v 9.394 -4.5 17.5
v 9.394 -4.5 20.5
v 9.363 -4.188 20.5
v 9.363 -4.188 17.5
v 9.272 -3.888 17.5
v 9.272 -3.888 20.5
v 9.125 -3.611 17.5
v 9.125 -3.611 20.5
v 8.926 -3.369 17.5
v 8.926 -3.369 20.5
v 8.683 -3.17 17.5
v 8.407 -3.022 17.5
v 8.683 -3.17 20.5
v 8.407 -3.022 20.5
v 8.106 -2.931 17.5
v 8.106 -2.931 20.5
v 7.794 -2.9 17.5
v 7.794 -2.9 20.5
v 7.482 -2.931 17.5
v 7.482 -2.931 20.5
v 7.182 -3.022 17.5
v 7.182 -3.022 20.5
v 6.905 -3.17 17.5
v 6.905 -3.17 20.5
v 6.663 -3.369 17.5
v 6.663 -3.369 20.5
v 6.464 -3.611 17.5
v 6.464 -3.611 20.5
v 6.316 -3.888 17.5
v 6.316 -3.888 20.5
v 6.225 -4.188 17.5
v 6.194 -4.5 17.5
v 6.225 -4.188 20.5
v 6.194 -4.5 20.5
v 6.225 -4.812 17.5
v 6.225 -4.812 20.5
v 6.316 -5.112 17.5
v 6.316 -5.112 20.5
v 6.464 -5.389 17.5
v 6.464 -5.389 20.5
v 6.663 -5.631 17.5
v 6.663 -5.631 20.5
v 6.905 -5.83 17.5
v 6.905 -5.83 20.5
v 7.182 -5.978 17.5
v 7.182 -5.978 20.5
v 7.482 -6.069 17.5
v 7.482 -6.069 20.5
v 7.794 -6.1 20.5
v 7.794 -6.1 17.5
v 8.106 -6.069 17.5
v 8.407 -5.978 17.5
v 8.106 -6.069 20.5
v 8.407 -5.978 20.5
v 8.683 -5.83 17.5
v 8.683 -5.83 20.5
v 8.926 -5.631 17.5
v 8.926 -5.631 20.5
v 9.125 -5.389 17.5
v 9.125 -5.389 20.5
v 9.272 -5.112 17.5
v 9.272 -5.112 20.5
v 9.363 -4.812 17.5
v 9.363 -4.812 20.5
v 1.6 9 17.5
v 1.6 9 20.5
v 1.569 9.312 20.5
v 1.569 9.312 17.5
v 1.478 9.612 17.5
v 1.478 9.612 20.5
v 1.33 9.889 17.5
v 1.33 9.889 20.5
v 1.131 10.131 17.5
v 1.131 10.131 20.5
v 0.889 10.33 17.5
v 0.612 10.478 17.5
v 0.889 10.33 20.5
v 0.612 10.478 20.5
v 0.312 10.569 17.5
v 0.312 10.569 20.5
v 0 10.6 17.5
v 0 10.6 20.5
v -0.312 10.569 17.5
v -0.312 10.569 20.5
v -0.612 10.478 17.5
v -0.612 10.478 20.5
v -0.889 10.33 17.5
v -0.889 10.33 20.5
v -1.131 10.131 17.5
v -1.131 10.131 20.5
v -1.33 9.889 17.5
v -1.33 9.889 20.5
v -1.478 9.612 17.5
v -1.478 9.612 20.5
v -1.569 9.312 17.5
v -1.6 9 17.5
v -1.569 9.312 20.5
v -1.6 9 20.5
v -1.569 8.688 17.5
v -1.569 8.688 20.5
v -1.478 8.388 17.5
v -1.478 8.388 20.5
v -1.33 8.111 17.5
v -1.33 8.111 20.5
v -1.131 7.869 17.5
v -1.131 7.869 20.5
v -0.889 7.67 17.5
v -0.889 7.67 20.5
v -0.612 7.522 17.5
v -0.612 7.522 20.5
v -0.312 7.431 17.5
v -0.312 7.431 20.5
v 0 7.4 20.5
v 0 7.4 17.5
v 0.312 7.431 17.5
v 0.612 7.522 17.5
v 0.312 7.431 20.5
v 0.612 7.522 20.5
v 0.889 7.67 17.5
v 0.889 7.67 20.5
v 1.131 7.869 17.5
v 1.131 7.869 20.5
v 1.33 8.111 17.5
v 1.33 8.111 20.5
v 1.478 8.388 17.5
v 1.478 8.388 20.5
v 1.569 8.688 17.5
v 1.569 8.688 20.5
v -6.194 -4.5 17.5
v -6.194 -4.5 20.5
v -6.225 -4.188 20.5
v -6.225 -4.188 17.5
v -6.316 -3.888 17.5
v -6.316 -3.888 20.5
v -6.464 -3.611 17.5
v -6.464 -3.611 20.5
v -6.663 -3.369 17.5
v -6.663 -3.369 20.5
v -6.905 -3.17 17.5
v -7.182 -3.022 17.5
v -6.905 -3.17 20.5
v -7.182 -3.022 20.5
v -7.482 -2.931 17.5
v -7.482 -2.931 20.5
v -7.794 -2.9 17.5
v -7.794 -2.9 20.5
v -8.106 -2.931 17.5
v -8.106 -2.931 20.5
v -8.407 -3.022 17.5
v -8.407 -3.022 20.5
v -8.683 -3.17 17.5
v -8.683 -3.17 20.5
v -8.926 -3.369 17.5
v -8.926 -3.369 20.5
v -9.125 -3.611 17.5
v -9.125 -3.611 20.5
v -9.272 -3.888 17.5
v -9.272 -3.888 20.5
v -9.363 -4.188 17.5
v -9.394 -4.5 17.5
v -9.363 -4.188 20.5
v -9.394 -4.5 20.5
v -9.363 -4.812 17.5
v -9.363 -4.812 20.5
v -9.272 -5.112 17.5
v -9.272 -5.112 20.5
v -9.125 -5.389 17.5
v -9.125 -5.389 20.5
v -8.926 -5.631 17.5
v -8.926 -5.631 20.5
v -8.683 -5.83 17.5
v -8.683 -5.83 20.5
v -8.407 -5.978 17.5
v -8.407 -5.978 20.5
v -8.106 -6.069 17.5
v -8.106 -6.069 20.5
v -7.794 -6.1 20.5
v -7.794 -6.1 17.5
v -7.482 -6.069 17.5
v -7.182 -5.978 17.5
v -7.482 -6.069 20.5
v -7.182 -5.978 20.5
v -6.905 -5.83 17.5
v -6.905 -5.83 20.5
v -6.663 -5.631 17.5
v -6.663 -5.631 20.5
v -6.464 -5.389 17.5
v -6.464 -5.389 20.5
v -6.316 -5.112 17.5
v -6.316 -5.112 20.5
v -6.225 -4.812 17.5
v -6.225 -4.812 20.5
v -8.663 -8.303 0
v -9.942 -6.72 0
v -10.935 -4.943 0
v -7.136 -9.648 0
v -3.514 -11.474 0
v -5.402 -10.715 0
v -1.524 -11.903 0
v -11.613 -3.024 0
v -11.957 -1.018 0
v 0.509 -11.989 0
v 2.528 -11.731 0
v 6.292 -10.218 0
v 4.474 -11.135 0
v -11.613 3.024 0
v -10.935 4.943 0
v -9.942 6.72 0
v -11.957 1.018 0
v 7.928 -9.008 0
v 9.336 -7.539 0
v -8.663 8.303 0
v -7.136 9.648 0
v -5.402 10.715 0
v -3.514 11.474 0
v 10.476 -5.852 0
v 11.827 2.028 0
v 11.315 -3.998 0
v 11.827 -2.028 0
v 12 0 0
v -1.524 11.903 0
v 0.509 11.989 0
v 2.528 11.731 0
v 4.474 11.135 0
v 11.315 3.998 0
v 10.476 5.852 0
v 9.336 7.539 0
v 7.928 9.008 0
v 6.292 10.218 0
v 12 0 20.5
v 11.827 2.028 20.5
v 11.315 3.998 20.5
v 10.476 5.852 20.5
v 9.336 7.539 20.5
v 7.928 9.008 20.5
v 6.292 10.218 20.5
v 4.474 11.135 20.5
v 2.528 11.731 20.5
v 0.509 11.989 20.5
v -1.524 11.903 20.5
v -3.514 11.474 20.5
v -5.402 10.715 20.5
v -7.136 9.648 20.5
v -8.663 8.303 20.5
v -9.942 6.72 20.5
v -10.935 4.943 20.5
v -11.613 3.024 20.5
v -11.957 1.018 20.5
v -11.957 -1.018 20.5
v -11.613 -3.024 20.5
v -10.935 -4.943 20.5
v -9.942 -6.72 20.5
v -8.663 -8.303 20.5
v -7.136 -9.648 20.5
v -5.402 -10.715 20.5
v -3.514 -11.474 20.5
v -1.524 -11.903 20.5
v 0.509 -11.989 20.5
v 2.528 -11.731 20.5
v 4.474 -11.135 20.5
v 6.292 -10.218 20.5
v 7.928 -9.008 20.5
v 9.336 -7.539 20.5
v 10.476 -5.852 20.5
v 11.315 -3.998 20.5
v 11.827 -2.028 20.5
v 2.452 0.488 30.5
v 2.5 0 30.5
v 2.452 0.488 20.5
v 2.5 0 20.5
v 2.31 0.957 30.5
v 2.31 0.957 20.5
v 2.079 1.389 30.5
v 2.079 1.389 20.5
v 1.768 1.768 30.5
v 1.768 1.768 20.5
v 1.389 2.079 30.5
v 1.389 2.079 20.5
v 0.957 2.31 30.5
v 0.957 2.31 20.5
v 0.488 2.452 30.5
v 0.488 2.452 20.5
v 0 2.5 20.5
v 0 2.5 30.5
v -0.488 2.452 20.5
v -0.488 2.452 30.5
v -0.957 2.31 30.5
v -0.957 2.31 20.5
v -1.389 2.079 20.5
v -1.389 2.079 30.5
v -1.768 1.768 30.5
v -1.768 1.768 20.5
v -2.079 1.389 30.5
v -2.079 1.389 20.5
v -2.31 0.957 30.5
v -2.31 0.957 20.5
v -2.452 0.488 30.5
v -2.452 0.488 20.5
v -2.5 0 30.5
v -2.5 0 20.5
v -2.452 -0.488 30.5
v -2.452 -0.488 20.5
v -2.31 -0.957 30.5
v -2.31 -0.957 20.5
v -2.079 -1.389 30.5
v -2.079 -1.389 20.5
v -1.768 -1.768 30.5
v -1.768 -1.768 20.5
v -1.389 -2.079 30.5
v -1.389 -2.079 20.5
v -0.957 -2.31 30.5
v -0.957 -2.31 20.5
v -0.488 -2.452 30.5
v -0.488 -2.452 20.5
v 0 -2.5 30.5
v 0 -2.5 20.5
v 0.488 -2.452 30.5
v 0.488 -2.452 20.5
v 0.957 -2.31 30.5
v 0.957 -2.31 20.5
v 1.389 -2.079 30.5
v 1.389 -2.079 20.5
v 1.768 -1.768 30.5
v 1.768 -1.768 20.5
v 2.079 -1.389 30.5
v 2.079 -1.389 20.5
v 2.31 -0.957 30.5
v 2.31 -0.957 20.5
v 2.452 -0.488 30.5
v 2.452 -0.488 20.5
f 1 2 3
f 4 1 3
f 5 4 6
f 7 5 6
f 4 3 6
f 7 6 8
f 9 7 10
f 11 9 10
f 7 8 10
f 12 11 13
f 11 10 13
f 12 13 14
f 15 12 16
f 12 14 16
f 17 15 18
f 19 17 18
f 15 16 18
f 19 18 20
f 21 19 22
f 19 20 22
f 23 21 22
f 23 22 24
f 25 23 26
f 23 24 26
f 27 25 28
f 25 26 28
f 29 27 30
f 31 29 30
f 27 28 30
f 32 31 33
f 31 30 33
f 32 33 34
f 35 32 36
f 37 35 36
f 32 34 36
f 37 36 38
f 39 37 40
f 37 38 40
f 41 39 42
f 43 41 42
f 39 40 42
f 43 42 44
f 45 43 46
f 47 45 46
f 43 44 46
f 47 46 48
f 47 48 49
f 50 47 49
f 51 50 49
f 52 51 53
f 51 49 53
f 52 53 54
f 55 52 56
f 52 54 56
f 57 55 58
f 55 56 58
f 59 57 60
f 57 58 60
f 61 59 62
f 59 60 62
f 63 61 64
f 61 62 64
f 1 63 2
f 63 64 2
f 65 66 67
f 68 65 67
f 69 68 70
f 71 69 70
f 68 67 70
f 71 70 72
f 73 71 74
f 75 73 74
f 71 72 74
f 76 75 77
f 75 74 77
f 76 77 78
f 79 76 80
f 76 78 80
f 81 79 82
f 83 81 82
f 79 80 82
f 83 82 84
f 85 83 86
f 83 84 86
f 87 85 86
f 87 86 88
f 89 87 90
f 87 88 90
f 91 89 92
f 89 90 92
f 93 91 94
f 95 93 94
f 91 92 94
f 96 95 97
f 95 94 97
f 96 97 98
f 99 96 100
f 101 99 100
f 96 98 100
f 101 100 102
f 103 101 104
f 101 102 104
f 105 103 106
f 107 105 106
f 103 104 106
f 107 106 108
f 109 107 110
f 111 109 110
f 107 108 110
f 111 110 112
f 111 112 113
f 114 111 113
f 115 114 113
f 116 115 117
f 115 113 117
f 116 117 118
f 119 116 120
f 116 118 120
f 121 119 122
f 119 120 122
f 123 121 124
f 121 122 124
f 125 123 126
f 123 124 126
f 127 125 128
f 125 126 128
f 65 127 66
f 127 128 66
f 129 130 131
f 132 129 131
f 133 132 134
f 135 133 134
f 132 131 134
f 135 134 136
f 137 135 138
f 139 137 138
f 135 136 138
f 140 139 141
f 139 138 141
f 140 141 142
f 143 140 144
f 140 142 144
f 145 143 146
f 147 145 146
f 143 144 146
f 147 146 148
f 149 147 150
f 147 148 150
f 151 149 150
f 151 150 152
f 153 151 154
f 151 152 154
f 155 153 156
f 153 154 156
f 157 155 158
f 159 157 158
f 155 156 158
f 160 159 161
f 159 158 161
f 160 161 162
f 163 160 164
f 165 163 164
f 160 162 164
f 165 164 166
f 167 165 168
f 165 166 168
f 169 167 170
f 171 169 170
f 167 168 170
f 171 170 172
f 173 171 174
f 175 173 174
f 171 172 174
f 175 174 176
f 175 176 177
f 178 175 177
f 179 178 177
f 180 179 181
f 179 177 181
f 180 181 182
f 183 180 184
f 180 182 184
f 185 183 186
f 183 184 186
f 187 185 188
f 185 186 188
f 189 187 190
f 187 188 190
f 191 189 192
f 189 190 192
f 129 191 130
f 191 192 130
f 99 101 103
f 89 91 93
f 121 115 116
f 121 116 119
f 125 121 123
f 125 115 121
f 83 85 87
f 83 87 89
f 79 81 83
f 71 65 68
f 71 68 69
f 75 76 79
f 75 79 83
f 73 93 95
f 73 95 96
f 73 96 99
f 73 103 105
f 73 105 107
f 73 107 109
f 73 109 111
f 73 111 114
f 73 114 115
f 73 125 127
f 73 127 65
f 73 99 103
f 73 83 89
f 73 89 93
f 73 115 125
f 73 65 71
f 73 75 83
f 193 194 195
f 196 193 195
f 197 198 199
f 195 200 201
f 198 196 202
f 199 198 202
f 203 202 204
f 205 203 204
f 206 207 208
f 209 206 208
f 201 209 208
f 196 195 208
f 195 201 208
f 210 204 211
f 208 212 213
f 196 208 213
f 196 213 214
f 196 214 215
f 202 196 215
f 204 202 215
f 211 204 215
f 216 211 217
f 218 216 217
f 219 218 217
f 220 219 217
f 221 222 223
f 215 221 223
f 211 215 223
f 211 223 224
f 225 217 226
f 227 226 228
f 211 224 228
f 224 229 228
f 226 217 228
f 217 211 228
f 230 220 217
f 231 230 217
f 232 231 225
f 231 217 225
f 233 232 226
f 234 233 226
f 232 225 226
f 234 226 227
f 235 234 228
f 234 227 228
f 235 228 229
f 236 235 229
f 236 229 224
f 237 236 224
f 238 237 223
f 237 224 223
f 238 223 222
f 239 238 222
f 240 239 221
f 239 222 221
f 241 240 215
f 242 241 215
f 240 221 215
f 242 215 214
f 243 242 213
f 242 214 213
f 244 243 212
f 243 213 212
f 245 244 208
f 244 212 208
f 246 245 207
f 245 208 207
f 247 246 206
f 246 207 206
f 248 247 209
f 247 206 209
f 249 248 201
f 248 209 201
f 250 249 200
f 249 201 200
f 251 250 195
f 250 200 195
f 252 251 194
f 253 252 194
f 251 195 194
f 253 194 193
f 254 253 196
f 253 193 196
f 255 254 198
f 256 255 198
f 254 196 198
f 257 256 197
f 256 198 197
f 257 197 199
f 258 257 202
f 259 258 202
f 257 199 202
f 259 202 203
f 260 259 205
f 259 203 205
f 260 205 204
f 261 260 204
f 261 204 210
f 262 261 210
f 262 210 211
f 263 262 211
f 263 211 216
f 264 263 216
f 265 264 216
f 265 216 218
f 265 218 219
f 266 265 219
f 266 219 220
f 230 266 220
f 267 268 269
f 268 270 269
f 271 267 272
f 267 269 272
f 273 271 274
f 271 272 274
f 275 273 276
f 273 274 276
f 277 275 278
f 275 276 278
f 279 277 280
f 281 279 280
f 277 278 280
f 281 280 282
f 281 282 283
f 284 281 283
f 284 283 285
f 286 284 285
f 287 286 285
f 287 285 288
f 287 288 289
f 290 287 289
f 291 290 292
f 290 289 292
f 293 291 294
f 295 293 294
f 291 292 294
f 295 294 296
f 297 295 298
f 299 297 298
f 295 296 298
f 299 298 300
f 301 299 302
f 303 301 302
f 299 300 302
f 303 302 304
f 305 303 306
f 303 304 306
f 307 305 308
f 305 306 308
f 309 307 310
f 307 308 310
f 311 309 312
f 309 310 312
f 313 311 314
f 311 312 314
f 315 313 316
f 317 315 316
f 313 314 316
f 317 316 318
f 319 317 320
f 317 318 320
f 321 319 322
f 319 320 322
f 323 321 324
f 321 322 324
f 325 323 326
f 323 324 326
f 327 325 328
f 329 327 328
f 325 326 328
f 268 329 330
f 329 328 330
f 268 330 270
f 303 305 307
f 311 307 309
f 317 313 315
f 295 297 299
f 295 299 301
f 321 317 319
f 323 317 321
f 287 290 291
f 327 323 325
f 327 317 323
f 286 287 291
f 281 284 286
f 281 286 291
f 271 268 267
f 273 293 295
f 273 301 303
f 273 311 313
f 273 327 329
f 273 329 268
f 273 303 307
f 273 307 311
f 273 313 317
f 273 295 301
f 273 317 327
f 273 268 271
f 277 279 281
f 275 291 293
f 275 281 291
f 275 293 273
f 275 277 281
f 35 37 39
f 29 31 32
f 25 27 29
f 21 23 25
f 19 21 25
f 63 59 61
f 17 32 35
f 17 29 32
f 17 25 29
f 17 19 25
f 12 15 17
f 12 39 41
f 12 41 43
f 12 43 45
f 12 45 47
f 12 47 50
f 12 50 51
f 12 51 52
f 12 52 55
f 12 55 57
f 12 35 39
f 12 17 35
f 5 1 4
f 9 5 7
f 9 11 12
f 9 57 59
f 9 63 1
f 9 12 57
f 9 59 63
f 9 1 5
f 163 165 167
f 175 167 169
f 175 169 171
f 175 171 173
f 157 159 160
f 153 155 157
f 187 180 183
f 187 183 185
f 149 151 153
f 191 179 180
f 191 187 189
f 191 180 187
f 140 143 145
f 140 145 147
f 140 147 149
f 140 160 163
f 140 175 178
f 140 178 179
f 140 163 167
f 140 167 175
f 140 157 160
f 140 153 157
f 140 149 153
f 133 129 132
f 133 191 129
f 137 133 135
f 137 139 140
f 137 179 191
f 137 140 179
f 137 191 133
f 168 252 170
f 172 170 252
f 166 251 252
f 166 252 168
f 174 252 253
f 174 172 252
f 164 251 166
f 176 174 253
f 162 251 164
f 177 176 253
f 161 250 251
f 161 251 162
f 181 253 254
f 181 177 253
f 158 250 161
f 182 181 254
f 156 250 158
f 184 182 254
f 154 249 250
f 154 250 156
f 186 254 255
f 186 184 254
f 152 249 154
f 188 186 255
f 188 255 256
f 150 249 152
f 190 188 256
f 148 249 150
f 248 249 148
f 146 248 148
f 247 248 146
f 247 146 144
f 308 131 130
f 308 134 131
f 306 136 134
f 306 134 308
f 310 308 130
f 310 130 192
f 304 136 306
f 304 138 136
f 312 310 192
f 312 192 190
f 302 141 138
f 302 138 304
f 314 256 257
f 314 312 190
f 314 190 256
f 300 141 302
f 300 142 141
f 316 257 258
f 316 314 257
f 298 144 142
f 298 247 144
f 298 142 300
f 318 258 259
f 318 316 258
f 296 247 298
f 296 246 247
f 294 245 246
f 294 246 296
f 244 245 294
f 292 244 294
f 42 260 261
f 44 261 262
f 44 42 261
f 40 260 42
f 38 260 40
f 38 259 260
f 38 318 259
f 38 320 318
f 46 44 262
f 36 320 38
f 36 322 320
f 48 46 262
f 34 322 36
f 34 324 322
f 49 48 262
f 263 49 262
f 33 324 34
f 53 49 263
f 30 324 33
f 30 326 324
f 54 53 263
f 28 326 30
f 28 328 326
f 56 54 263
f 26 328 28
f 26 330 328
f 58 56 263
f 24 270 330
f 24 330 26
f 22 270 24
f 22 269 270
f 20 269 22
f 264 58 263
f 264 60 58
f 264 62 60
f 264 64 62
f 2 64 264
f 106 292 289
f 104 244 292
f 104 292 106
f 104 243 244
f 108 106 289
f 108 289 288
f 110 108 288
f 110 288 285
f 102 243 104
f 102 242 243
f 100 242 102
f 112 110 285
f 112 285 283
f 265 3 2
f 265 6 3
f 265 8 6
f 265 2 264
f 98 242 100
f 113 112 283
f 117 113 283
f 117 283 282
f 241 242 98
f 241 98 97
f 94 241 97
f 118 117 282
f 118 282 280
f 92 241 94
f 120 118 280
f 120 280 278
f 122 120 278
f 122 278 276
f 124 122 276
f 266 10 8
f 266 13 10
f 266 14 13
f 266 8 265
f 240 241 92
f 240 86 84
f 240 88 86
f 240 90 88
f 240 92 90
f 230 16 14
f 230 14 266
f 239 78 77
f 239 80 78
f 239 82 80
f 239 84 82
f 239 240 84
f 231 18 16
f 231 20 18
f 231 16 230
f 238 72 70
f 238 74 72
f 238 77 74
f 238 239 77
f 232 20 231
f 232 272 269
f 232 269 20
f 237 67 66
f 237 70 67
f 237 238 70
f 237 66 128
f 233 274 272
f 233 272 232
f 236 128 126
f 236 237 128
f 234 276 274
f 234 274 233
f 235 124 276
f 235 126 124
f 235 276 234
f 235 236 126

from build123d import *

# Parameters (mm, degrees)
ESQUISSE1_R             = 12
BOSS_EXTRU_1_DEPTH      = 20.5
ESQUISSE2_R             = 2.5
BOSS_EXTRU_2_DEPTH      = 2
ESQUISSE3_R             = 1.6
ENL_V_MAT_EXTRU_1_DEPTH = 3
ESQUISSE4_R             = 2.5
BOSS_EXTRU_3_DEPTH      = 8


with BuildPart() as part:
    # Esquisse1 → Boss.-Extru.1 (new body)
    with BuildSketch(Plane.XY):
        Circle(ESQUISSE1_R)
    extrude(amount=BOSS_EXTRU_1_DEPTH)

    # Esquisse2 → Boss.-Extru.2 (add)
    with BuildSketch(Plane.XY.offset(20.5)):
        Circle(ESQUISSE2_R)
    extrude(amount=BOSS_EXTRU_2_DEPTH)

    # Esquisse3 → Enlèv. mat.-Extru.1 (cut)
    with BuildSketch(Plane.XY.offset(20.5)):
        with Locations((0, 9)):
            Circle(ESQUISSE3_R)
        with Locations((-7.794228634, -4.5)):
            Circle(ESQUISSE3_R)
        with Locations((7.794228634, -4.5)):
            Circle(ESQUISSE3_R)
    extrude(amount=-ENL_V_MAT_EXTRU_1_DEPTH, mode=Mode.SUBTRACT)

    # Esquisse4 → Boss.-Extru.3 (add)
    with BuildSketch(Plane.XY.offset(22.5)):
        Circle(ESQUISSE4_R)
    extrude(amount=BOSS_EXTRU_3_DEPTH)


solid = part.part
